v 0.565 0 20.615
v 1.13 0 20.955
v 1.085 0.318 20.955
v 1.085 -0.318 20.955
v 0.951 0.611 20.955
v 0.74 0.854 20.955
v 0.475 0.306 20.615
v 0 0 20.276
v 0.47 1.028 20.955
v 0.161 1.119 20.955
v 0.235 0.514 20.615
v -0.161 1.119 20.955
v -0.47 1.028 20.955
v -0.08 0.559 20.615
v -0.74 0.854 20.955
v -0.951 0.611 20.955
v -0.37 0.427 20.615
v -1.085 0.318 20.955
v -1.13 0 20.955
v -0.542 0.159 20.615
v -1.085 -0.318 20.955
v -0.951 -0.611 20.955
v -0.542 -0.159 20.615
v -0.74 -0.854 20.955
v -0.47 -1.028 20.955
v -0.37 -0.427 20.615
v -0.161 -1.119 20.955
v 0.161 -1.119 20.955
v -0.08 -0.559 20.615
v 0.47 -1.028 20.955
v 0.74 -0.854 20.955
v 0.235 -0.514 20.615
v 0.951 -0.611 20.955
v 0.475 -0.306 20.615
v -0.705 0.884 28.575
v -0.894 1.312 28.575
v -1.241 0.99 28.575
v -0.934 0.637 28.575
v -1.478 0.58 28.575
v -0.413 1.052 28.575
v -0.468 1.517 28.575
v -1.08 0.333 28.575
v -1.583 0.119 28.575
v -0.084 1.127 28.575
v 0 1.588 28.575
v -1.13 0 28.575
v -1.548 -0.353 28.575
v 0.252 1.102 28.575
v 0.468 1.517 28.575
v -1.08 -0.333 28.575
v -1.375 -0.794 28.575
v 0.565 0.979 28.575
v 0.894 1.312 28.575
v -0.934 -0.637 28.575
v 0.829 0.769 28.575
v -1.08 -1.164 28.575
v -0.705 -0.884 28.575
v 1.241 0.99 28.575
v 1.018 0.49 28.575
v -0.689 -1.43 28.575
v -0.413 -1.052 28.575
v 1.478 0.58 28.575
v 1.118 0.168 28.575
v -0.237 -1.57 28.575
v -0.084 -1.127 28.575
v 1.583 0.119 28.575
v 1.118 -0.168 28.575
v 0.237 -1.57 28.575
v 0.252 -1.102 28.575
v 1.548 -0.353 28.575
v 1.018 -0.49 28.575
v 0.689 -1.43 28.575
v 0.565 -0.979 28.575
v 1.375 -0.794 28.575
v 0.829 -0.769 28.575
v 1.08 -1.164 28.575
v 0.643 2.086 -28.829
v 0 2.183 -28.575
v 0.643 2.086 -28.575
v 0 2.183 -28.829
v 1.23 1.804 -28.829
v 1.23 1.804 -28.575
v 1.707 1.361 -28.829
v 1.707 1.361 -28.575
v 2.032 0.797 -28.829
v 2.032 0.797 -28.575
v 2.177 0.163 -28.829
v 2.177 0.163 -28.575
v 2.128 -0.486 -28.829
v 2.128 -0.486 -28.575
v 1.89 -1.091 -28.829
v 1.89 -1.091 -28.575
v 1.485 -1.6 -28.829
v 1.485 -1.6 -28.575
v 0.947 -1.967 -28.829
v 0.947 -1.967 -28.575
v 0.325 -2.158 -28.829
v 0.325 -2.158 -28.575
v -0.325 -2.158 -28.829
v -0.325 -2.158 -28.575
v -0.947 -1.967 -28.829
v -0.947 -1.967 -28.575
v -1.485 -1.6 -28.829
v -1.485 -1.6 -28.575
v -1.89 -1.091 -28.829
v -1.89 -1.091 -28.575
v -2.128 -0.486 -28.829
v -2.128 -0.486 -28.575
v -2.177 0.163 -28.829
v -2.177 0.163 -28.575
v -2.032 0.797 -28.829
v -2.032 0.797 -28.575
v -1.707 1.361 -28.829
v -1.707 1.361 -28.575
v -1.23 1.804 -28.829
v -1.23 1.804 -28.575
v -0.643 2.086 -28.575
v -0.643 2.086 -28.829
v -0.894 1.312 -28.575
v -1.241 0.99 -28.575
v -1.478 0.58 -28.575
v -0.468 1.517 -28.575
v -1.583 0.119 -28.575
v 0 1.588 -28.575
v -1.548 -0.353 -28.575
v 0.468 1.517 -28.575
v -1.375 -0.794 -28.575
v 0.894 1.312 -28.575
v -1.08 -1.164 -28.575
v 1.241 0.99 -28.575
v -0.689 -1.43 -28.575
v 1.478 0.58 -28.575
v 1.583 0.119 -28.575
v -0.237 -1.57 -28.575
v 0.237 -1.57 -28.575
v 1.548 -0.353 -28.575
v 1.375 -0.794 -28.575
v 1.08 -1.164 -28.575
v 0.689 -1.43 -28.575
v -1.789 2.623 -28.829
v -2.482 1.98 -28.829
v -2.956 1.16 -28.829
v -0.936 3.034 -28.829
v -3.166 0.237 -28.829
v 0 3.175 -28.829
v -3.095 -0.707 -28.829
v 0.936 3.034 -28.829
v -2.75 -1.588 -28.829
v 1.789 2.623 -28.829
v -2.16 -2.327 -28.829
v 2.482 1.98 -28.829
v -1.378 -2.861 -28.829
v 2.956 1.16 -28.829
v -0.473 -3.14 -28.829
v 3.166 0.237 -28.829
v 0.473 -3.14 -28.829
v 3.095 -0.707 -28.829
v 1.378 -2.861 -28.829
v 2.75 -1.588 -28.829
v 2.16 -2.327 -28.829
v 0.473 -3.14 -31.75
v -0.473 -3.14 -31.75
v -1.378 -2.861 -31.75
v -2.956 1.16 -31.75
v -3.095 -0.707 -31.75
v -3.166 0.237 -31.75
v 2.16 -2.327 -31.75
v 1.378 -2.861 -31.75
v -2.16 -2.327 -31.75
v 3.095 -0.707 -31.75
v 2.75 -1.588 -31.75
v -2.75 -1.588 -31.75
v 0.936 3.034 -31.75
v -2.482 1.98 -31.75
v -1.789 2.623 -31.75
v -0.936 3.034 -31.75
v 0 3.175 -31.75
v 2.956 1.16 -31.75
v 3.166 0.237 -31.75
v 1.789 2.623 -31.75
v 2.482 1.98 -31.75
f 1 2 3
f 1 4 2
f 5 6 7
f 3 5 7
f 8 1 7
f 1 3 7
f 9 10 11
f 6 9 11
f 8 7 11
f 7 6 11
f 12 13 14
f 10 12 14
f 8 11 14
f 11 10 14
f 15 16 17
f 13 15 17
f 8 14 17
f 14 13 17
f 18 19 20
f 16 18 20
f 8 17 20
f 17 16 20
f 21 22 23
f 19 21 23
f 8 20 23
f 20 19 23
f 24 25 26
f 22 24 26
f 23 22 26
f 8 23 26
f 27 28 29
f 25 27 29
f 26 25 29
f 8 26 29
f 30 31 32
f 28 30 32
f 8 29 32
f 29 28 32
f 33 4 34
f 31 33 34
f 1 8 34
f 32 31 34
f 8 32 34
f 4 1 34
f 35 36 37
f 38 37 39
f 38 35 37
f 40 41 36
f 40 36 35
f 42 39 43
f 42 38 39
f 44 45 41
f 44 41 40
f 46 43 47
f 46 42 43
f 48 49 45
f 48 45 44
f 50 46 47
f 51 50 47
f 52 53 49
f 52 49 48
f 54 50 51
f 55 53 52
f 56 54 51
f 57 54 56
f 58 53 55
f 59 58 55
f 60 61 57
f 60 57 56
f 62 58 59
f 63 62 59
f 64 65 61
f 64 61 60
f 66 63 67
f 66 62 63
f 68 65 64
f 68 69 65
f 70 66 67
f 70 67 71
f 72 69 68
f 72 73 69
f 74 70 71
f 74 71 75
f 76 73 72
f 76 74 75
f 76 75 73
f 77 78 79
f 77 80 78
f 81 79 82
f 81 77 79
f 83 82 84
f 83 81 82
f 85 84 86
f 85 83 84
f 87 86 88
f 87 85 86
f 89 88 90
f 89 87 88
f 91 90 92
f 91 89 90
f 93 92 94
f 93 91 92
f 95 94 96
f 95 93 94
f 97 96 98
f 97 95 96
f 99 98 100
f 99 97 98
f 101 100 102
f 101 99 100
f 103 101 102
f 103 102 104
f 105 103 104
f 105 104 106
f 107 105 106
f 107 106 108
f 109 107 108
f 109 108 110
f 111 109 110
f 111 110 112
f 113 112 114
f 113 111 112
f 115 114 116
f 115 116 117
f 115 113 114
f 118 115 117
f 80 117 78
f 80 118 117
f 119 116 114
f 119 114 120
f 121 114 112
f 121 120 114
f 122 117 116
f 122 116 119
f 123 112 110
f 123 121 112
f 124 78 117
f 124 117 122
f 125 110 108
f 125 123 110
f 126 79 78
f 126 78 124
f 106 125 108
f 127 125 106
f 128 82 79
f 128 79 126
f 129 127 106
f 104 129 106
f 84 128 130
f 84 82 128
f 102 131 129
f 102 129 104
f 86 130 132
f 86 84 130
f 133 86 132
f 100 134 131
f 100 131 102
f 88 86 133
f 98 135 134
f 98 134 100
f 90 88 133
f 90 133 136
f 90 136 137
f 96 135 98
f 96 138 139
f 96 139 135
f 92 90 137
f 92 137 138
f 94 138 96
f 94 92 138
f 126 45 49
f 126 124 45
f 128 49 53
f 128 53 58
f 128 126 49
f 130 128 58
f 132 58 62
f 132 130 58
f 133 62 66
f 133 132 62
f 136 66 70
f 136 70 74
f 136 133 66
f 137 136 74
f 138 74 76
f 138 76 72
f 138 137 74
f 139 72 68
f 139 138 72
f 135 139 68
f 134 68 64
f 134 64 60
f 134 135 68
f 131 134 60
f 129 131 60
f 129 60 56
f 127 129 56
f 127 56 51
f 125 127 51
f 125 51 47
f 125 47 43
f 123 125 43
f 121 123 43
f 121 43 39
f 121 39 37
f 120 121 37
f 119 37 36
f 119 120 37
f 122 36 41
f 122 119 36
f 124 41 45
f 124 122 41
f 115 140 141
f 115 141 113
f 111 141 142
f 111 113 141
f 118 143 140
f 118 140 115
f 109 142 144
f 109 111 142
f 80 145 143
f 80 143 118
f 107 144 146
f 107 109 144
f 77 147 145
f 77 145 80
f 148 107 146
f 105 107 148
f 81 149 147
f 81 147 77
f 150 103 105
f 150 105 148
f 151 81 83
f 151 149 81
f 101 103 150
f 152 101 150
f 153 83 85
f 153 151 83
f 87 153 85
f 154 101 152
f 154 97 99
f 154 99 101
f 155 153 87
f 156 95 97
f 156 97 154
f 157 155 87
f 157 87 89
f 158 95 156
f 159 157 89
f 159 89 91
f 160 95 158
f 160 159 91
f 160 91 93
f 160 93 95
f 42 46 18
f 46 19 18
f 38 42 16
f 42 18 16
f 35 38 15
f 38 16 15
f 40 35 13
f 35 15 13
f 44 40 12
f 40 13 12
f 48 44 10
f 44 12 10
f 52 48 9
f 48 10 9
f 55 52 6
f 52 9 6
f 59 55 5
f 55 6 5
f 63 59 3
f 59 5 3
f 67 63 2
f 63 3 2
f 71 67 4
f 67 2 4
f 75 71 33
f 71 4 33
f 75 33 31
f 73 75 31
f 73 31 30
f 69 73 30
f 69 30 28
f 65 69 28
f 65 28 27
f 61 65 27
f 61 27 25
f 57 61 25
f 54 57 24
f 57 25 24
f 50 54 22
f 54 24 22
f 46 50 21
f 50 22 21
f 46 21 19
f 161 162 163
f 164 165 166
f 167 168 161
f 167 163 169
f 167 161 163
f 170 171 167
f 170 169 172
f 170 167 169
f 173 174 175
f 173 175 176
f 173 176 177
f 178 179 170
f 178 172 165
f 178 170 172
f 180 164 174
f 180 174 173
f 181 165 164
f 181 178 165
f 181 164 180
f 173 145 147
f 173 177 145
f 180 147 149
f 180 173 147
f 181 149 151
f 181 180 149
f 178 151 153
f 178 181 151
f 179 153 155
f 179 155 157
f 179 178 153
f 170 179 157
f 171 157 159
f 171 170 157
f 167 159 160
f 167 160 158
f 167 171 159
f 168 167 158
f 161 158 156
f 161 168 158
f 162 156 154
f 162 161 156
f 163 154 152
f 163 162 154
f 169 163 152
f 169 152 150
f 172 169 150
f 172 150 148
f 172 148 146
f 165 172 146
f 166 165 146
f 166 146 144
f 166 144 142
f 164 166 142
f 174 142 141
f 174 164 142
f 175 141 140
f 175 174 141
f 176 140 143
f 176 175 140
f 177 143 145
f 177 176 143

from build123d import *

# Parameters (mm, degrees)
SKETCH1_W                 = 57.15
SKETCH1_H                 = 1.5875
F_4_40_TAPPED_HOLE1_D     = 2.2606
F_4_40_TAPPED_HOLE1_DEPTH = 7.62
F_4_40_TAPPED_HOLE1_TIP   = 0.679152758


with BuildPart() as part:
    # Sketch1 → Revolve1 (revolve)
    with BuildSketch(Plane(origin=(0, 0, 0), x_dir=(0, 0, -1), z_dir=(1, 0, 0))):
        with Locations((0, 0.79375)):
            Rectangle(SKETCH1_W, SKETCH1_H)
        Polygon((31.75, 0), (28.575, 0), (28.575, 1.5875), (28.575, 2.1828125), (28.829, 2.1828125), (28.829, 3.175), (31.75, 3.175), align=None)
    revolve(axis=Axis((0, 0, 28.575), (0, 0, -1)))

    # #4-40 Tapped Hole1
    with Locations(Plane.XY.offset(28.575)):
        with Locations((0, 0)):
            Hole(F_4_40_TAPPED_HOLE1_D / 2, depth=F_4_40_TAPPED_HOLE1_DEPTH)
            with Locations((0, 0, -(F_4_40_TAPPED_HOLE1_DEPTH + F_4_40_TAPPED_HOLE1_TIP / 2))):  # 118° drill point
                Cone(0, F_4_40_TAPPED_HOLE1_D / 2, F_4_40_TAPPED_HOLE1_TIP, mode=Mode.SUBTRACT)


solid = part.part
